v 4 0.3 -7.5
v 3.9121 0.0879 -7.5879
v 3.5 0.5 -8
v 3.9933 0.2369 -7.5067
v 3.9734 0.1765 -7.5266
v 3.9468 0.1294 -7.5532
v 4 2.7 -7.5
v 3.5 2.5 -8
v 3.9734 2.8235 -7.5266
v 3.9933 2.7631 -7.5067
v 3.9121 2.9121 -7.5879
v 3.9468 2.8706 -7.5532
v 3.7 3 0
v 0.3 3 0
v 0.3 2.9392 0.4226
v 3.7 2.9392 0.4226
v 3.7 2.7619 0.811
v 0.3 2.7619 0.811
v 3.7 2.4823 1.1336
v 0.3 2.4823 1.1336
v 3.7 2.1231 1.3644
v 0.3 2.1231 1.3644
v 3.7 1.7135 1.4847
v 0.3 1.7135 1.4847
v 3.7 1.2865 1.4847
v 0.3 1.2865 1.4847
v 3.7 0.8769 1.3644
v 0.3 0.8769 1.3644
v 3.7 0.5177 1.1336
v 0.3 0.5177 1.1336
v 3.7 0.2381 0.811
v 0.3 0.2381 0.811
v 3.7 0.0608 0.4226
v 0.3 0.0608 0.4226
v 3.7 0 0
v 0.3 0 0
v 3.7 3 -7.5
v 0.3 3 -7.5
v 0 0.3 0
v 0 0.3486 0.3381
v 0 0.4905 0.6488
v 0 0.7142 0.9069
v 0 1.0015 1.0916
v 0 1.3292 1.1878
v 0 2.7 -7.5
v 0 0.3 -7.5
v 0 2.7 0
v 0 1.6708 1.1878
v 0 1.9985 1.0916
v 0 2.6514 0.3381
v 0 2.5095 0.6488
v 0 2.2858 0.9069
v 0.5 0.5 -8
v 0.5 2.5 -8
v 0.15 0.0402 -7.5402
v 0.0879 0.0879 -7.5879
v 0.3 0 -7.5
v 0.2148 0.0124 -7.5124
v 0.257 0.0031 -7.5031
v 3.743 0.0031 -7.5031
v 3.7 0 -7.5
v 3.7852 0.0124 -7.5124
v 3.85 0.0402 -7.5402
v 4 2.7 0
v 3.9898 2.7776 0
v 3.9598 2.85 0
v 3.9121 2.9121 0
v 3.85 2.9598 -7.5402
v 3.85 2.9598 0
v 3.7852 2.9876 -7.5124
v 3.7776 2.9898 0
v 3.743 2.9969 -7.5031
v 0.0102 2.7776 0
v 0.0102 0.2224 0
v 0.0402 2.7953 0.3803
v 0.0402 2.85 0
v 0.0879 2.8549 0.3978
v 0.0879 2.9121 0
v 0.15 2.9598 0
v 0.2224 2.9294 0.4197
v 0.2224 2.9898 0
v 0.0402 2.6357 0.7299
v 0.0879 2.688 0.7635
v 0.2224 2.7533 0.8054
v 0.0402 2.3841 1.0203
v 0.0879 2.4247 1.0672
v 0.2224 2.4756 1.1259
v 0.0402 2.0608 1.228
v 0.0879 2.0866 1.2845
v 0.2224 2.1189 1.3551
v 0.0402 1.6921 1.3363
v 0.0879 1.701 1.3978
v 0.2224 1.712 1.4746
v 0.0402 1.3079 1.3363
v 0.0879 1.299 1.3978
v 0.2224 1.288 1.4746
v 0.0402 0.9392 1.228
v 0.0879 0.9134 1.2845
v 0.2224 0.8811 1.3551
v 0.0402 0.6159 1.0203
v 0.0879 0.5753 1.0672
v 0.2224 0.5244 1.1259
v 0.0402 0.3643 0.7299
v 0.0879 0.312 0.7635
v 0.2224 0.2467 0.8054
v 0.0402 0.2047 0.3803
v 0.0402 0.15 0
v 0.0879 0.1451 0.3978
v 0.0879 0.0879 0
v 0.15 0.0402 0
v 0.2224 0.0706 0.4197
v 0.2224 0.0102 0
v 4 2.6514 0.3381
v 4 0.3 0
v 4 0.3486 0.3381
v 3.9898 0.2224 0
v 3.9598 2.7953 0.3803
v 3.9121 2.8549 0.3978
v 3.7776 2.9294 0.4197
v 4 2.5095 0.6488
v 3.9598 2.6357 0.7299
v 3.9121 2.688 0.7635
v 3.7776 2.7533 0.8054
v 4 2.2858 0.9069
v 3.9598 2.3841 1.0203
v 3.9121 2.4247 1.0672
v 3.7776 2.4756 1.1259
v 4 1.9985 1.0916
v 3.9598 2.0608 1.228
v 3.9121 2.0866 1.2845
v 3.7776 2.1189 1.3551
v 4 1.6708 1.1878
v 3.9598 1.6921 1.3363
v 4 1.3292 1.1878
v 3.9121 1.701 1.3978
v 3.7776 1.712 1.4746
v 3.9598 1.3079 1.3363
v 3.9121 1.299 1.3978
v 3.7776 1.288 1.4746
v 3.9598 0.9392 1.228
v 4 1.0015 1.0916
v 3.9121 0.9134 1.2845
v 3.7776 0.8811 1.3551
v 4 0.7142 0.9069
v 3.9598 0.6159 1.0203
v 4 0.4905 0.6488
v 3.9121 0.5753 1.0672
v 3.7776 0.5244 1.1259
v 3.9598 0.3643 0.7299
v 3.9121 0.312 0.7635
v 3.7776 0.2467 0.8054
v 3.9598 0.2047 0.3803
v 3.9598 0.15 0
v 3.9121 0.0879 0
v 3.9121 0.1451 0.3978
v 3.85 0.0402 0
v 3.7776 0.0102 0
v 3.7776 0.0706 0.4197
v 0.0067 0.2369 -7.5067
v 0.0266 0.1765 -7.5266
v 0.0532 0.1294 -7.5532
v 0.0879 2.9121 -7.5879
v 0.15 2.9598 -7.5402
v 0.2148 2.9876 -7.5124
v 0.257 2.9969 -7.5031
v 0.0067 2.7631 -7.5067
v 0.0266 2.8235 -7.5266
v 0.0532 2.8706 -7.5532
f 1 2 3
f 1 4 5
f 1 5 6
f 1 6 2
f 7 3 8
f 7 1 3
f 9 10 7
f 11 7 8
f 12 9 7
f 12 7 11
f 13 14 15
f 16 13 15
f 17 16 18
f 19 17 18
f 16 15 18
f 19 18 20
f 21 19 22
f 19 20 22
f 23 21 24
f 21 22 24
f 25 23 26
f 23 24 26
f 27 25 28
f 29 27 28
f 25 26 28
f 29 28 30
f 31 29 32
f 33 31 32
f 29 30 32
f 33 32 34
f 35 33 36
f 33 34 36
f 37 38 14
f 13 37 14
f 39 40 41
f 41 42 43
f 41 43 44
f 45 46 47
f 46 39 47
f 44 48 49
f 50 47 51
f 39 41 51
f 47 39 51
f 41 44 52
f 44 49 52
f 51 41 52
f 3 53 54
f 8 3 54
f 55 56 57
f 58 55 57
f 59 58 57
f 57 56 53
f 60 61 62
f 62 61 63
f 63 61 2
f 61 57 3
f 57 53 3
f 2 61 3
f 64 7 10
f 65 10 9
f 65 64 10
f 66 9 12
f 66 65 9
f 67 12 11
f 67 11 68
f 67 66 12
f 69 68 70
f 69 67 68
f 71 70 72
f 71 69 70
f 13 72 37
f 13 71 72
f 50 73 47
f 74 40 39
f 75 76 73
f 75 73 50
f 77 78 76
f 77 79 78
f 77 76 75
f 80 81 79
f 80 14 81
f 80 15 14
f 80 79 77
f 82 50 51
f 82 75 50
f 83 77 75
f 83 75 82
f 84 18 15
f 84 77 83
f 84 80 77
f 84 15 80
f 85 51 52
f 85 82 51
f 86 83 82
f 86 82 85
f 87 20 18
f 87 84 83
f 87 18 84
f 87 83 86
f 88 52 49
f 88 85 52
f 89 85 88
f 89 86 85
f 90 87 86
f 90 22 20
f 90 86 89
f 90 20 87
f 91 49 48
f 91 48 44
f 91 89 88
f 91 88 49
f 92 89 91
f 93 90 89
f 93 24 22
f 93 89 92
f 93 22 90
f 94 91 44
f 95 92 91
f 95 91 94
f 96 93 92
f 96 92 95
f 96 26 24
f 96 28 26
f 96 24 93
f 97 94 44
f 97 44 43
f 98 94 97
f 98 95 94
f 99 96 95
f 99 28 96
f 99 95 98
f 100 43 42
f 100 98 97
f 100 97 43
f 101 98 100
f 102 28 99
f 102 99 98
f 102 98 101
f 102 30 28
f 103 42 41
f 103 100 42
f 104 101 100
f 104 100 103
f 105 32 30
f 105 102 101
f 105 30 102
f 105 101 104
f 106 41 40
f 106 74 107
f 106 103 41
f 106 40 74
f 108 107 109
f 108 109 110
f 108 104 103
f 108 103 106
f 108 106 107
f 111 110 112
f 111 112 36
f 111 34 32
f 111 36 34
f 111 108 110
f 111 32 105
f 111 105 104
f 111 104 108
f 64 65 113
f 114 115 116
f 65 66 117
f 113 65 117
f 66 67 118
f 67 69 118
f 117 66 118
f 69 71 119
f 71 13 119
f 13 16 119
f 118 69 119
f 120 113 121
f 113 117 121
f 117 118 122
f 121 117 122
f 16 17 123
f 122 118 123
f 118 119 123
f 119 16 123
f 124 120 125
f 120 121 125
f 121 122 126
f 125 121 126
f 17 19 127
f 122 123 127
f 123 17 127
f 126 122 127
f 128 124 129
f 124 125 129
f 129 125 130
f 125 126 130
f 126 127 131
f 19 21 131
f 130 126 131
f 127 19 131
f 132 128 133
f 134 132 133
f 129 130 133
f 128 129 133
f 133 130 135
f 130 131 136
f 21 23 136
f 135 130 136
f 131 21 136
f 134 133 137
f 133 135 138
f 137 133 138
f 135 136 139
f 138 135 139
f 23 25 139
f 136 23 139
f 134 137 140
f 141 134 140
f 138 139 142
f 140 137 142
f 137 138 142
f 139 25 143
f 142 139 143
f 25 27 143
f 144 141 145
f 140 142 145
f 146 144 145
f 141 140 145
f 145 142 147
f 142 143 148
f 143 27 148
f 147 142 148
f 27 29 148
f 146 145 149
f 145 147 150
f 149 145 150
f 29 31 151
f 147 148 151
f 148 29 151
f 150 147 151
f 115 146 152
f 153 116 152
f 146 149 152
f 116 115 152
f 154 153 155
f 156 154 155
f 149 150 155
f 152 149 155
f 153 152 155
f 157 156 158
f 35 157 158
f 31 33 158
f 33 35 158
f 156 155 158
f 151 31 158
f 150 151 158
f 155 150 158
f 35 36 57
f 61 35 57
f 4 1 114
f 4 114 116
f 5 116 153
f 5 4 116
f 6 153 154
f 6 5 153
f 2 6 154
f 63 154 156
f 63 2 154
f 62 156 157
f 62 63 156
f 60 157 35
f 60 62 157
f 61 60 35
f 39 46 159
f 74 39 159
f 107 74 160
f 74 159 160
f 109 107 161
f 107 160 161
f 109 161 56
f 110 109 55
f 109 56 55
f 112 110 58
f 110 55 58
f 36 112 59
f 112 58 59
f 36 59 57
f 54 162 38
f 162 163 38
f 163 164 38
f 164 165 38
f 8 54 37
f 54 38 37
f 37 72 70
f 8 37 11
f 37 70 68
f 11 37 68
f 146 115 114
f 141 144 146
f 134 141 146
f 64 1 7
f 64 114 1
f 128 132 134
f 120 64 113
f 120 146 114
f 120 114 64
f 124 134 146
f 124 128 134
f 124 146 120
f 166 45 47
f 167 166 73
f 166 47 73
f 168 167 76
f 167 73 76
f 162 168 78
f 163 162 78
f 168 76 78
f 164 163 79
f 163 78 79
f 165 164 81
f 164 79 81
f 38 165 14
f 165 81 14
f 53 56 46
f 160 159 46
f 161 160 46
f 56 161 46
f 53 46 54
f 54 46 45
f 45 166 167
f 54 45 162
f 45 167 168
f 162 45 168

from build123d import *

# Parameters (mm, degrees)
F1_DEPTH = 4
F2_SIZE  = 0.5
F3_R     = 0.3


with BuildPart() as f1:
    # F0 (on Right) → F1 (new body)
    with BuildSketch(Plane.YZ):
        with BuildLine():
            Line((0, 0), (0, -8))
            Line((0, -8), (3, -8))
            Line((3, -8), (3, 0))
            ThreePointArc((3, 0), (1.5, 1.5), (0, 0))
        make_face()
    extrude(amount=F1_DEPTH)

    # F2
    f2_edges = [f1.edges().sort_by_distance(p)[0] for p in [
        (2, 0, -8),
        (2, 3, -8),
        (0, 1.5, -8),
        (4, 1.5, -8),
    ]]
    chamfer(f2_edges, length=F2_SIZE)

    # F3
    f3_edges = [f1.edges().sort_by_distance(p)[0] for p in [
        (0, 3, -3.75),
        (0, 1.5, 1.5),
        (0, 0, -3.75),
        (4, 3, -3.75),
        (4, 1.5, 1.5),
    ]]
    fillet(f3_edges, radius=F3_R)


solid = f1.part
